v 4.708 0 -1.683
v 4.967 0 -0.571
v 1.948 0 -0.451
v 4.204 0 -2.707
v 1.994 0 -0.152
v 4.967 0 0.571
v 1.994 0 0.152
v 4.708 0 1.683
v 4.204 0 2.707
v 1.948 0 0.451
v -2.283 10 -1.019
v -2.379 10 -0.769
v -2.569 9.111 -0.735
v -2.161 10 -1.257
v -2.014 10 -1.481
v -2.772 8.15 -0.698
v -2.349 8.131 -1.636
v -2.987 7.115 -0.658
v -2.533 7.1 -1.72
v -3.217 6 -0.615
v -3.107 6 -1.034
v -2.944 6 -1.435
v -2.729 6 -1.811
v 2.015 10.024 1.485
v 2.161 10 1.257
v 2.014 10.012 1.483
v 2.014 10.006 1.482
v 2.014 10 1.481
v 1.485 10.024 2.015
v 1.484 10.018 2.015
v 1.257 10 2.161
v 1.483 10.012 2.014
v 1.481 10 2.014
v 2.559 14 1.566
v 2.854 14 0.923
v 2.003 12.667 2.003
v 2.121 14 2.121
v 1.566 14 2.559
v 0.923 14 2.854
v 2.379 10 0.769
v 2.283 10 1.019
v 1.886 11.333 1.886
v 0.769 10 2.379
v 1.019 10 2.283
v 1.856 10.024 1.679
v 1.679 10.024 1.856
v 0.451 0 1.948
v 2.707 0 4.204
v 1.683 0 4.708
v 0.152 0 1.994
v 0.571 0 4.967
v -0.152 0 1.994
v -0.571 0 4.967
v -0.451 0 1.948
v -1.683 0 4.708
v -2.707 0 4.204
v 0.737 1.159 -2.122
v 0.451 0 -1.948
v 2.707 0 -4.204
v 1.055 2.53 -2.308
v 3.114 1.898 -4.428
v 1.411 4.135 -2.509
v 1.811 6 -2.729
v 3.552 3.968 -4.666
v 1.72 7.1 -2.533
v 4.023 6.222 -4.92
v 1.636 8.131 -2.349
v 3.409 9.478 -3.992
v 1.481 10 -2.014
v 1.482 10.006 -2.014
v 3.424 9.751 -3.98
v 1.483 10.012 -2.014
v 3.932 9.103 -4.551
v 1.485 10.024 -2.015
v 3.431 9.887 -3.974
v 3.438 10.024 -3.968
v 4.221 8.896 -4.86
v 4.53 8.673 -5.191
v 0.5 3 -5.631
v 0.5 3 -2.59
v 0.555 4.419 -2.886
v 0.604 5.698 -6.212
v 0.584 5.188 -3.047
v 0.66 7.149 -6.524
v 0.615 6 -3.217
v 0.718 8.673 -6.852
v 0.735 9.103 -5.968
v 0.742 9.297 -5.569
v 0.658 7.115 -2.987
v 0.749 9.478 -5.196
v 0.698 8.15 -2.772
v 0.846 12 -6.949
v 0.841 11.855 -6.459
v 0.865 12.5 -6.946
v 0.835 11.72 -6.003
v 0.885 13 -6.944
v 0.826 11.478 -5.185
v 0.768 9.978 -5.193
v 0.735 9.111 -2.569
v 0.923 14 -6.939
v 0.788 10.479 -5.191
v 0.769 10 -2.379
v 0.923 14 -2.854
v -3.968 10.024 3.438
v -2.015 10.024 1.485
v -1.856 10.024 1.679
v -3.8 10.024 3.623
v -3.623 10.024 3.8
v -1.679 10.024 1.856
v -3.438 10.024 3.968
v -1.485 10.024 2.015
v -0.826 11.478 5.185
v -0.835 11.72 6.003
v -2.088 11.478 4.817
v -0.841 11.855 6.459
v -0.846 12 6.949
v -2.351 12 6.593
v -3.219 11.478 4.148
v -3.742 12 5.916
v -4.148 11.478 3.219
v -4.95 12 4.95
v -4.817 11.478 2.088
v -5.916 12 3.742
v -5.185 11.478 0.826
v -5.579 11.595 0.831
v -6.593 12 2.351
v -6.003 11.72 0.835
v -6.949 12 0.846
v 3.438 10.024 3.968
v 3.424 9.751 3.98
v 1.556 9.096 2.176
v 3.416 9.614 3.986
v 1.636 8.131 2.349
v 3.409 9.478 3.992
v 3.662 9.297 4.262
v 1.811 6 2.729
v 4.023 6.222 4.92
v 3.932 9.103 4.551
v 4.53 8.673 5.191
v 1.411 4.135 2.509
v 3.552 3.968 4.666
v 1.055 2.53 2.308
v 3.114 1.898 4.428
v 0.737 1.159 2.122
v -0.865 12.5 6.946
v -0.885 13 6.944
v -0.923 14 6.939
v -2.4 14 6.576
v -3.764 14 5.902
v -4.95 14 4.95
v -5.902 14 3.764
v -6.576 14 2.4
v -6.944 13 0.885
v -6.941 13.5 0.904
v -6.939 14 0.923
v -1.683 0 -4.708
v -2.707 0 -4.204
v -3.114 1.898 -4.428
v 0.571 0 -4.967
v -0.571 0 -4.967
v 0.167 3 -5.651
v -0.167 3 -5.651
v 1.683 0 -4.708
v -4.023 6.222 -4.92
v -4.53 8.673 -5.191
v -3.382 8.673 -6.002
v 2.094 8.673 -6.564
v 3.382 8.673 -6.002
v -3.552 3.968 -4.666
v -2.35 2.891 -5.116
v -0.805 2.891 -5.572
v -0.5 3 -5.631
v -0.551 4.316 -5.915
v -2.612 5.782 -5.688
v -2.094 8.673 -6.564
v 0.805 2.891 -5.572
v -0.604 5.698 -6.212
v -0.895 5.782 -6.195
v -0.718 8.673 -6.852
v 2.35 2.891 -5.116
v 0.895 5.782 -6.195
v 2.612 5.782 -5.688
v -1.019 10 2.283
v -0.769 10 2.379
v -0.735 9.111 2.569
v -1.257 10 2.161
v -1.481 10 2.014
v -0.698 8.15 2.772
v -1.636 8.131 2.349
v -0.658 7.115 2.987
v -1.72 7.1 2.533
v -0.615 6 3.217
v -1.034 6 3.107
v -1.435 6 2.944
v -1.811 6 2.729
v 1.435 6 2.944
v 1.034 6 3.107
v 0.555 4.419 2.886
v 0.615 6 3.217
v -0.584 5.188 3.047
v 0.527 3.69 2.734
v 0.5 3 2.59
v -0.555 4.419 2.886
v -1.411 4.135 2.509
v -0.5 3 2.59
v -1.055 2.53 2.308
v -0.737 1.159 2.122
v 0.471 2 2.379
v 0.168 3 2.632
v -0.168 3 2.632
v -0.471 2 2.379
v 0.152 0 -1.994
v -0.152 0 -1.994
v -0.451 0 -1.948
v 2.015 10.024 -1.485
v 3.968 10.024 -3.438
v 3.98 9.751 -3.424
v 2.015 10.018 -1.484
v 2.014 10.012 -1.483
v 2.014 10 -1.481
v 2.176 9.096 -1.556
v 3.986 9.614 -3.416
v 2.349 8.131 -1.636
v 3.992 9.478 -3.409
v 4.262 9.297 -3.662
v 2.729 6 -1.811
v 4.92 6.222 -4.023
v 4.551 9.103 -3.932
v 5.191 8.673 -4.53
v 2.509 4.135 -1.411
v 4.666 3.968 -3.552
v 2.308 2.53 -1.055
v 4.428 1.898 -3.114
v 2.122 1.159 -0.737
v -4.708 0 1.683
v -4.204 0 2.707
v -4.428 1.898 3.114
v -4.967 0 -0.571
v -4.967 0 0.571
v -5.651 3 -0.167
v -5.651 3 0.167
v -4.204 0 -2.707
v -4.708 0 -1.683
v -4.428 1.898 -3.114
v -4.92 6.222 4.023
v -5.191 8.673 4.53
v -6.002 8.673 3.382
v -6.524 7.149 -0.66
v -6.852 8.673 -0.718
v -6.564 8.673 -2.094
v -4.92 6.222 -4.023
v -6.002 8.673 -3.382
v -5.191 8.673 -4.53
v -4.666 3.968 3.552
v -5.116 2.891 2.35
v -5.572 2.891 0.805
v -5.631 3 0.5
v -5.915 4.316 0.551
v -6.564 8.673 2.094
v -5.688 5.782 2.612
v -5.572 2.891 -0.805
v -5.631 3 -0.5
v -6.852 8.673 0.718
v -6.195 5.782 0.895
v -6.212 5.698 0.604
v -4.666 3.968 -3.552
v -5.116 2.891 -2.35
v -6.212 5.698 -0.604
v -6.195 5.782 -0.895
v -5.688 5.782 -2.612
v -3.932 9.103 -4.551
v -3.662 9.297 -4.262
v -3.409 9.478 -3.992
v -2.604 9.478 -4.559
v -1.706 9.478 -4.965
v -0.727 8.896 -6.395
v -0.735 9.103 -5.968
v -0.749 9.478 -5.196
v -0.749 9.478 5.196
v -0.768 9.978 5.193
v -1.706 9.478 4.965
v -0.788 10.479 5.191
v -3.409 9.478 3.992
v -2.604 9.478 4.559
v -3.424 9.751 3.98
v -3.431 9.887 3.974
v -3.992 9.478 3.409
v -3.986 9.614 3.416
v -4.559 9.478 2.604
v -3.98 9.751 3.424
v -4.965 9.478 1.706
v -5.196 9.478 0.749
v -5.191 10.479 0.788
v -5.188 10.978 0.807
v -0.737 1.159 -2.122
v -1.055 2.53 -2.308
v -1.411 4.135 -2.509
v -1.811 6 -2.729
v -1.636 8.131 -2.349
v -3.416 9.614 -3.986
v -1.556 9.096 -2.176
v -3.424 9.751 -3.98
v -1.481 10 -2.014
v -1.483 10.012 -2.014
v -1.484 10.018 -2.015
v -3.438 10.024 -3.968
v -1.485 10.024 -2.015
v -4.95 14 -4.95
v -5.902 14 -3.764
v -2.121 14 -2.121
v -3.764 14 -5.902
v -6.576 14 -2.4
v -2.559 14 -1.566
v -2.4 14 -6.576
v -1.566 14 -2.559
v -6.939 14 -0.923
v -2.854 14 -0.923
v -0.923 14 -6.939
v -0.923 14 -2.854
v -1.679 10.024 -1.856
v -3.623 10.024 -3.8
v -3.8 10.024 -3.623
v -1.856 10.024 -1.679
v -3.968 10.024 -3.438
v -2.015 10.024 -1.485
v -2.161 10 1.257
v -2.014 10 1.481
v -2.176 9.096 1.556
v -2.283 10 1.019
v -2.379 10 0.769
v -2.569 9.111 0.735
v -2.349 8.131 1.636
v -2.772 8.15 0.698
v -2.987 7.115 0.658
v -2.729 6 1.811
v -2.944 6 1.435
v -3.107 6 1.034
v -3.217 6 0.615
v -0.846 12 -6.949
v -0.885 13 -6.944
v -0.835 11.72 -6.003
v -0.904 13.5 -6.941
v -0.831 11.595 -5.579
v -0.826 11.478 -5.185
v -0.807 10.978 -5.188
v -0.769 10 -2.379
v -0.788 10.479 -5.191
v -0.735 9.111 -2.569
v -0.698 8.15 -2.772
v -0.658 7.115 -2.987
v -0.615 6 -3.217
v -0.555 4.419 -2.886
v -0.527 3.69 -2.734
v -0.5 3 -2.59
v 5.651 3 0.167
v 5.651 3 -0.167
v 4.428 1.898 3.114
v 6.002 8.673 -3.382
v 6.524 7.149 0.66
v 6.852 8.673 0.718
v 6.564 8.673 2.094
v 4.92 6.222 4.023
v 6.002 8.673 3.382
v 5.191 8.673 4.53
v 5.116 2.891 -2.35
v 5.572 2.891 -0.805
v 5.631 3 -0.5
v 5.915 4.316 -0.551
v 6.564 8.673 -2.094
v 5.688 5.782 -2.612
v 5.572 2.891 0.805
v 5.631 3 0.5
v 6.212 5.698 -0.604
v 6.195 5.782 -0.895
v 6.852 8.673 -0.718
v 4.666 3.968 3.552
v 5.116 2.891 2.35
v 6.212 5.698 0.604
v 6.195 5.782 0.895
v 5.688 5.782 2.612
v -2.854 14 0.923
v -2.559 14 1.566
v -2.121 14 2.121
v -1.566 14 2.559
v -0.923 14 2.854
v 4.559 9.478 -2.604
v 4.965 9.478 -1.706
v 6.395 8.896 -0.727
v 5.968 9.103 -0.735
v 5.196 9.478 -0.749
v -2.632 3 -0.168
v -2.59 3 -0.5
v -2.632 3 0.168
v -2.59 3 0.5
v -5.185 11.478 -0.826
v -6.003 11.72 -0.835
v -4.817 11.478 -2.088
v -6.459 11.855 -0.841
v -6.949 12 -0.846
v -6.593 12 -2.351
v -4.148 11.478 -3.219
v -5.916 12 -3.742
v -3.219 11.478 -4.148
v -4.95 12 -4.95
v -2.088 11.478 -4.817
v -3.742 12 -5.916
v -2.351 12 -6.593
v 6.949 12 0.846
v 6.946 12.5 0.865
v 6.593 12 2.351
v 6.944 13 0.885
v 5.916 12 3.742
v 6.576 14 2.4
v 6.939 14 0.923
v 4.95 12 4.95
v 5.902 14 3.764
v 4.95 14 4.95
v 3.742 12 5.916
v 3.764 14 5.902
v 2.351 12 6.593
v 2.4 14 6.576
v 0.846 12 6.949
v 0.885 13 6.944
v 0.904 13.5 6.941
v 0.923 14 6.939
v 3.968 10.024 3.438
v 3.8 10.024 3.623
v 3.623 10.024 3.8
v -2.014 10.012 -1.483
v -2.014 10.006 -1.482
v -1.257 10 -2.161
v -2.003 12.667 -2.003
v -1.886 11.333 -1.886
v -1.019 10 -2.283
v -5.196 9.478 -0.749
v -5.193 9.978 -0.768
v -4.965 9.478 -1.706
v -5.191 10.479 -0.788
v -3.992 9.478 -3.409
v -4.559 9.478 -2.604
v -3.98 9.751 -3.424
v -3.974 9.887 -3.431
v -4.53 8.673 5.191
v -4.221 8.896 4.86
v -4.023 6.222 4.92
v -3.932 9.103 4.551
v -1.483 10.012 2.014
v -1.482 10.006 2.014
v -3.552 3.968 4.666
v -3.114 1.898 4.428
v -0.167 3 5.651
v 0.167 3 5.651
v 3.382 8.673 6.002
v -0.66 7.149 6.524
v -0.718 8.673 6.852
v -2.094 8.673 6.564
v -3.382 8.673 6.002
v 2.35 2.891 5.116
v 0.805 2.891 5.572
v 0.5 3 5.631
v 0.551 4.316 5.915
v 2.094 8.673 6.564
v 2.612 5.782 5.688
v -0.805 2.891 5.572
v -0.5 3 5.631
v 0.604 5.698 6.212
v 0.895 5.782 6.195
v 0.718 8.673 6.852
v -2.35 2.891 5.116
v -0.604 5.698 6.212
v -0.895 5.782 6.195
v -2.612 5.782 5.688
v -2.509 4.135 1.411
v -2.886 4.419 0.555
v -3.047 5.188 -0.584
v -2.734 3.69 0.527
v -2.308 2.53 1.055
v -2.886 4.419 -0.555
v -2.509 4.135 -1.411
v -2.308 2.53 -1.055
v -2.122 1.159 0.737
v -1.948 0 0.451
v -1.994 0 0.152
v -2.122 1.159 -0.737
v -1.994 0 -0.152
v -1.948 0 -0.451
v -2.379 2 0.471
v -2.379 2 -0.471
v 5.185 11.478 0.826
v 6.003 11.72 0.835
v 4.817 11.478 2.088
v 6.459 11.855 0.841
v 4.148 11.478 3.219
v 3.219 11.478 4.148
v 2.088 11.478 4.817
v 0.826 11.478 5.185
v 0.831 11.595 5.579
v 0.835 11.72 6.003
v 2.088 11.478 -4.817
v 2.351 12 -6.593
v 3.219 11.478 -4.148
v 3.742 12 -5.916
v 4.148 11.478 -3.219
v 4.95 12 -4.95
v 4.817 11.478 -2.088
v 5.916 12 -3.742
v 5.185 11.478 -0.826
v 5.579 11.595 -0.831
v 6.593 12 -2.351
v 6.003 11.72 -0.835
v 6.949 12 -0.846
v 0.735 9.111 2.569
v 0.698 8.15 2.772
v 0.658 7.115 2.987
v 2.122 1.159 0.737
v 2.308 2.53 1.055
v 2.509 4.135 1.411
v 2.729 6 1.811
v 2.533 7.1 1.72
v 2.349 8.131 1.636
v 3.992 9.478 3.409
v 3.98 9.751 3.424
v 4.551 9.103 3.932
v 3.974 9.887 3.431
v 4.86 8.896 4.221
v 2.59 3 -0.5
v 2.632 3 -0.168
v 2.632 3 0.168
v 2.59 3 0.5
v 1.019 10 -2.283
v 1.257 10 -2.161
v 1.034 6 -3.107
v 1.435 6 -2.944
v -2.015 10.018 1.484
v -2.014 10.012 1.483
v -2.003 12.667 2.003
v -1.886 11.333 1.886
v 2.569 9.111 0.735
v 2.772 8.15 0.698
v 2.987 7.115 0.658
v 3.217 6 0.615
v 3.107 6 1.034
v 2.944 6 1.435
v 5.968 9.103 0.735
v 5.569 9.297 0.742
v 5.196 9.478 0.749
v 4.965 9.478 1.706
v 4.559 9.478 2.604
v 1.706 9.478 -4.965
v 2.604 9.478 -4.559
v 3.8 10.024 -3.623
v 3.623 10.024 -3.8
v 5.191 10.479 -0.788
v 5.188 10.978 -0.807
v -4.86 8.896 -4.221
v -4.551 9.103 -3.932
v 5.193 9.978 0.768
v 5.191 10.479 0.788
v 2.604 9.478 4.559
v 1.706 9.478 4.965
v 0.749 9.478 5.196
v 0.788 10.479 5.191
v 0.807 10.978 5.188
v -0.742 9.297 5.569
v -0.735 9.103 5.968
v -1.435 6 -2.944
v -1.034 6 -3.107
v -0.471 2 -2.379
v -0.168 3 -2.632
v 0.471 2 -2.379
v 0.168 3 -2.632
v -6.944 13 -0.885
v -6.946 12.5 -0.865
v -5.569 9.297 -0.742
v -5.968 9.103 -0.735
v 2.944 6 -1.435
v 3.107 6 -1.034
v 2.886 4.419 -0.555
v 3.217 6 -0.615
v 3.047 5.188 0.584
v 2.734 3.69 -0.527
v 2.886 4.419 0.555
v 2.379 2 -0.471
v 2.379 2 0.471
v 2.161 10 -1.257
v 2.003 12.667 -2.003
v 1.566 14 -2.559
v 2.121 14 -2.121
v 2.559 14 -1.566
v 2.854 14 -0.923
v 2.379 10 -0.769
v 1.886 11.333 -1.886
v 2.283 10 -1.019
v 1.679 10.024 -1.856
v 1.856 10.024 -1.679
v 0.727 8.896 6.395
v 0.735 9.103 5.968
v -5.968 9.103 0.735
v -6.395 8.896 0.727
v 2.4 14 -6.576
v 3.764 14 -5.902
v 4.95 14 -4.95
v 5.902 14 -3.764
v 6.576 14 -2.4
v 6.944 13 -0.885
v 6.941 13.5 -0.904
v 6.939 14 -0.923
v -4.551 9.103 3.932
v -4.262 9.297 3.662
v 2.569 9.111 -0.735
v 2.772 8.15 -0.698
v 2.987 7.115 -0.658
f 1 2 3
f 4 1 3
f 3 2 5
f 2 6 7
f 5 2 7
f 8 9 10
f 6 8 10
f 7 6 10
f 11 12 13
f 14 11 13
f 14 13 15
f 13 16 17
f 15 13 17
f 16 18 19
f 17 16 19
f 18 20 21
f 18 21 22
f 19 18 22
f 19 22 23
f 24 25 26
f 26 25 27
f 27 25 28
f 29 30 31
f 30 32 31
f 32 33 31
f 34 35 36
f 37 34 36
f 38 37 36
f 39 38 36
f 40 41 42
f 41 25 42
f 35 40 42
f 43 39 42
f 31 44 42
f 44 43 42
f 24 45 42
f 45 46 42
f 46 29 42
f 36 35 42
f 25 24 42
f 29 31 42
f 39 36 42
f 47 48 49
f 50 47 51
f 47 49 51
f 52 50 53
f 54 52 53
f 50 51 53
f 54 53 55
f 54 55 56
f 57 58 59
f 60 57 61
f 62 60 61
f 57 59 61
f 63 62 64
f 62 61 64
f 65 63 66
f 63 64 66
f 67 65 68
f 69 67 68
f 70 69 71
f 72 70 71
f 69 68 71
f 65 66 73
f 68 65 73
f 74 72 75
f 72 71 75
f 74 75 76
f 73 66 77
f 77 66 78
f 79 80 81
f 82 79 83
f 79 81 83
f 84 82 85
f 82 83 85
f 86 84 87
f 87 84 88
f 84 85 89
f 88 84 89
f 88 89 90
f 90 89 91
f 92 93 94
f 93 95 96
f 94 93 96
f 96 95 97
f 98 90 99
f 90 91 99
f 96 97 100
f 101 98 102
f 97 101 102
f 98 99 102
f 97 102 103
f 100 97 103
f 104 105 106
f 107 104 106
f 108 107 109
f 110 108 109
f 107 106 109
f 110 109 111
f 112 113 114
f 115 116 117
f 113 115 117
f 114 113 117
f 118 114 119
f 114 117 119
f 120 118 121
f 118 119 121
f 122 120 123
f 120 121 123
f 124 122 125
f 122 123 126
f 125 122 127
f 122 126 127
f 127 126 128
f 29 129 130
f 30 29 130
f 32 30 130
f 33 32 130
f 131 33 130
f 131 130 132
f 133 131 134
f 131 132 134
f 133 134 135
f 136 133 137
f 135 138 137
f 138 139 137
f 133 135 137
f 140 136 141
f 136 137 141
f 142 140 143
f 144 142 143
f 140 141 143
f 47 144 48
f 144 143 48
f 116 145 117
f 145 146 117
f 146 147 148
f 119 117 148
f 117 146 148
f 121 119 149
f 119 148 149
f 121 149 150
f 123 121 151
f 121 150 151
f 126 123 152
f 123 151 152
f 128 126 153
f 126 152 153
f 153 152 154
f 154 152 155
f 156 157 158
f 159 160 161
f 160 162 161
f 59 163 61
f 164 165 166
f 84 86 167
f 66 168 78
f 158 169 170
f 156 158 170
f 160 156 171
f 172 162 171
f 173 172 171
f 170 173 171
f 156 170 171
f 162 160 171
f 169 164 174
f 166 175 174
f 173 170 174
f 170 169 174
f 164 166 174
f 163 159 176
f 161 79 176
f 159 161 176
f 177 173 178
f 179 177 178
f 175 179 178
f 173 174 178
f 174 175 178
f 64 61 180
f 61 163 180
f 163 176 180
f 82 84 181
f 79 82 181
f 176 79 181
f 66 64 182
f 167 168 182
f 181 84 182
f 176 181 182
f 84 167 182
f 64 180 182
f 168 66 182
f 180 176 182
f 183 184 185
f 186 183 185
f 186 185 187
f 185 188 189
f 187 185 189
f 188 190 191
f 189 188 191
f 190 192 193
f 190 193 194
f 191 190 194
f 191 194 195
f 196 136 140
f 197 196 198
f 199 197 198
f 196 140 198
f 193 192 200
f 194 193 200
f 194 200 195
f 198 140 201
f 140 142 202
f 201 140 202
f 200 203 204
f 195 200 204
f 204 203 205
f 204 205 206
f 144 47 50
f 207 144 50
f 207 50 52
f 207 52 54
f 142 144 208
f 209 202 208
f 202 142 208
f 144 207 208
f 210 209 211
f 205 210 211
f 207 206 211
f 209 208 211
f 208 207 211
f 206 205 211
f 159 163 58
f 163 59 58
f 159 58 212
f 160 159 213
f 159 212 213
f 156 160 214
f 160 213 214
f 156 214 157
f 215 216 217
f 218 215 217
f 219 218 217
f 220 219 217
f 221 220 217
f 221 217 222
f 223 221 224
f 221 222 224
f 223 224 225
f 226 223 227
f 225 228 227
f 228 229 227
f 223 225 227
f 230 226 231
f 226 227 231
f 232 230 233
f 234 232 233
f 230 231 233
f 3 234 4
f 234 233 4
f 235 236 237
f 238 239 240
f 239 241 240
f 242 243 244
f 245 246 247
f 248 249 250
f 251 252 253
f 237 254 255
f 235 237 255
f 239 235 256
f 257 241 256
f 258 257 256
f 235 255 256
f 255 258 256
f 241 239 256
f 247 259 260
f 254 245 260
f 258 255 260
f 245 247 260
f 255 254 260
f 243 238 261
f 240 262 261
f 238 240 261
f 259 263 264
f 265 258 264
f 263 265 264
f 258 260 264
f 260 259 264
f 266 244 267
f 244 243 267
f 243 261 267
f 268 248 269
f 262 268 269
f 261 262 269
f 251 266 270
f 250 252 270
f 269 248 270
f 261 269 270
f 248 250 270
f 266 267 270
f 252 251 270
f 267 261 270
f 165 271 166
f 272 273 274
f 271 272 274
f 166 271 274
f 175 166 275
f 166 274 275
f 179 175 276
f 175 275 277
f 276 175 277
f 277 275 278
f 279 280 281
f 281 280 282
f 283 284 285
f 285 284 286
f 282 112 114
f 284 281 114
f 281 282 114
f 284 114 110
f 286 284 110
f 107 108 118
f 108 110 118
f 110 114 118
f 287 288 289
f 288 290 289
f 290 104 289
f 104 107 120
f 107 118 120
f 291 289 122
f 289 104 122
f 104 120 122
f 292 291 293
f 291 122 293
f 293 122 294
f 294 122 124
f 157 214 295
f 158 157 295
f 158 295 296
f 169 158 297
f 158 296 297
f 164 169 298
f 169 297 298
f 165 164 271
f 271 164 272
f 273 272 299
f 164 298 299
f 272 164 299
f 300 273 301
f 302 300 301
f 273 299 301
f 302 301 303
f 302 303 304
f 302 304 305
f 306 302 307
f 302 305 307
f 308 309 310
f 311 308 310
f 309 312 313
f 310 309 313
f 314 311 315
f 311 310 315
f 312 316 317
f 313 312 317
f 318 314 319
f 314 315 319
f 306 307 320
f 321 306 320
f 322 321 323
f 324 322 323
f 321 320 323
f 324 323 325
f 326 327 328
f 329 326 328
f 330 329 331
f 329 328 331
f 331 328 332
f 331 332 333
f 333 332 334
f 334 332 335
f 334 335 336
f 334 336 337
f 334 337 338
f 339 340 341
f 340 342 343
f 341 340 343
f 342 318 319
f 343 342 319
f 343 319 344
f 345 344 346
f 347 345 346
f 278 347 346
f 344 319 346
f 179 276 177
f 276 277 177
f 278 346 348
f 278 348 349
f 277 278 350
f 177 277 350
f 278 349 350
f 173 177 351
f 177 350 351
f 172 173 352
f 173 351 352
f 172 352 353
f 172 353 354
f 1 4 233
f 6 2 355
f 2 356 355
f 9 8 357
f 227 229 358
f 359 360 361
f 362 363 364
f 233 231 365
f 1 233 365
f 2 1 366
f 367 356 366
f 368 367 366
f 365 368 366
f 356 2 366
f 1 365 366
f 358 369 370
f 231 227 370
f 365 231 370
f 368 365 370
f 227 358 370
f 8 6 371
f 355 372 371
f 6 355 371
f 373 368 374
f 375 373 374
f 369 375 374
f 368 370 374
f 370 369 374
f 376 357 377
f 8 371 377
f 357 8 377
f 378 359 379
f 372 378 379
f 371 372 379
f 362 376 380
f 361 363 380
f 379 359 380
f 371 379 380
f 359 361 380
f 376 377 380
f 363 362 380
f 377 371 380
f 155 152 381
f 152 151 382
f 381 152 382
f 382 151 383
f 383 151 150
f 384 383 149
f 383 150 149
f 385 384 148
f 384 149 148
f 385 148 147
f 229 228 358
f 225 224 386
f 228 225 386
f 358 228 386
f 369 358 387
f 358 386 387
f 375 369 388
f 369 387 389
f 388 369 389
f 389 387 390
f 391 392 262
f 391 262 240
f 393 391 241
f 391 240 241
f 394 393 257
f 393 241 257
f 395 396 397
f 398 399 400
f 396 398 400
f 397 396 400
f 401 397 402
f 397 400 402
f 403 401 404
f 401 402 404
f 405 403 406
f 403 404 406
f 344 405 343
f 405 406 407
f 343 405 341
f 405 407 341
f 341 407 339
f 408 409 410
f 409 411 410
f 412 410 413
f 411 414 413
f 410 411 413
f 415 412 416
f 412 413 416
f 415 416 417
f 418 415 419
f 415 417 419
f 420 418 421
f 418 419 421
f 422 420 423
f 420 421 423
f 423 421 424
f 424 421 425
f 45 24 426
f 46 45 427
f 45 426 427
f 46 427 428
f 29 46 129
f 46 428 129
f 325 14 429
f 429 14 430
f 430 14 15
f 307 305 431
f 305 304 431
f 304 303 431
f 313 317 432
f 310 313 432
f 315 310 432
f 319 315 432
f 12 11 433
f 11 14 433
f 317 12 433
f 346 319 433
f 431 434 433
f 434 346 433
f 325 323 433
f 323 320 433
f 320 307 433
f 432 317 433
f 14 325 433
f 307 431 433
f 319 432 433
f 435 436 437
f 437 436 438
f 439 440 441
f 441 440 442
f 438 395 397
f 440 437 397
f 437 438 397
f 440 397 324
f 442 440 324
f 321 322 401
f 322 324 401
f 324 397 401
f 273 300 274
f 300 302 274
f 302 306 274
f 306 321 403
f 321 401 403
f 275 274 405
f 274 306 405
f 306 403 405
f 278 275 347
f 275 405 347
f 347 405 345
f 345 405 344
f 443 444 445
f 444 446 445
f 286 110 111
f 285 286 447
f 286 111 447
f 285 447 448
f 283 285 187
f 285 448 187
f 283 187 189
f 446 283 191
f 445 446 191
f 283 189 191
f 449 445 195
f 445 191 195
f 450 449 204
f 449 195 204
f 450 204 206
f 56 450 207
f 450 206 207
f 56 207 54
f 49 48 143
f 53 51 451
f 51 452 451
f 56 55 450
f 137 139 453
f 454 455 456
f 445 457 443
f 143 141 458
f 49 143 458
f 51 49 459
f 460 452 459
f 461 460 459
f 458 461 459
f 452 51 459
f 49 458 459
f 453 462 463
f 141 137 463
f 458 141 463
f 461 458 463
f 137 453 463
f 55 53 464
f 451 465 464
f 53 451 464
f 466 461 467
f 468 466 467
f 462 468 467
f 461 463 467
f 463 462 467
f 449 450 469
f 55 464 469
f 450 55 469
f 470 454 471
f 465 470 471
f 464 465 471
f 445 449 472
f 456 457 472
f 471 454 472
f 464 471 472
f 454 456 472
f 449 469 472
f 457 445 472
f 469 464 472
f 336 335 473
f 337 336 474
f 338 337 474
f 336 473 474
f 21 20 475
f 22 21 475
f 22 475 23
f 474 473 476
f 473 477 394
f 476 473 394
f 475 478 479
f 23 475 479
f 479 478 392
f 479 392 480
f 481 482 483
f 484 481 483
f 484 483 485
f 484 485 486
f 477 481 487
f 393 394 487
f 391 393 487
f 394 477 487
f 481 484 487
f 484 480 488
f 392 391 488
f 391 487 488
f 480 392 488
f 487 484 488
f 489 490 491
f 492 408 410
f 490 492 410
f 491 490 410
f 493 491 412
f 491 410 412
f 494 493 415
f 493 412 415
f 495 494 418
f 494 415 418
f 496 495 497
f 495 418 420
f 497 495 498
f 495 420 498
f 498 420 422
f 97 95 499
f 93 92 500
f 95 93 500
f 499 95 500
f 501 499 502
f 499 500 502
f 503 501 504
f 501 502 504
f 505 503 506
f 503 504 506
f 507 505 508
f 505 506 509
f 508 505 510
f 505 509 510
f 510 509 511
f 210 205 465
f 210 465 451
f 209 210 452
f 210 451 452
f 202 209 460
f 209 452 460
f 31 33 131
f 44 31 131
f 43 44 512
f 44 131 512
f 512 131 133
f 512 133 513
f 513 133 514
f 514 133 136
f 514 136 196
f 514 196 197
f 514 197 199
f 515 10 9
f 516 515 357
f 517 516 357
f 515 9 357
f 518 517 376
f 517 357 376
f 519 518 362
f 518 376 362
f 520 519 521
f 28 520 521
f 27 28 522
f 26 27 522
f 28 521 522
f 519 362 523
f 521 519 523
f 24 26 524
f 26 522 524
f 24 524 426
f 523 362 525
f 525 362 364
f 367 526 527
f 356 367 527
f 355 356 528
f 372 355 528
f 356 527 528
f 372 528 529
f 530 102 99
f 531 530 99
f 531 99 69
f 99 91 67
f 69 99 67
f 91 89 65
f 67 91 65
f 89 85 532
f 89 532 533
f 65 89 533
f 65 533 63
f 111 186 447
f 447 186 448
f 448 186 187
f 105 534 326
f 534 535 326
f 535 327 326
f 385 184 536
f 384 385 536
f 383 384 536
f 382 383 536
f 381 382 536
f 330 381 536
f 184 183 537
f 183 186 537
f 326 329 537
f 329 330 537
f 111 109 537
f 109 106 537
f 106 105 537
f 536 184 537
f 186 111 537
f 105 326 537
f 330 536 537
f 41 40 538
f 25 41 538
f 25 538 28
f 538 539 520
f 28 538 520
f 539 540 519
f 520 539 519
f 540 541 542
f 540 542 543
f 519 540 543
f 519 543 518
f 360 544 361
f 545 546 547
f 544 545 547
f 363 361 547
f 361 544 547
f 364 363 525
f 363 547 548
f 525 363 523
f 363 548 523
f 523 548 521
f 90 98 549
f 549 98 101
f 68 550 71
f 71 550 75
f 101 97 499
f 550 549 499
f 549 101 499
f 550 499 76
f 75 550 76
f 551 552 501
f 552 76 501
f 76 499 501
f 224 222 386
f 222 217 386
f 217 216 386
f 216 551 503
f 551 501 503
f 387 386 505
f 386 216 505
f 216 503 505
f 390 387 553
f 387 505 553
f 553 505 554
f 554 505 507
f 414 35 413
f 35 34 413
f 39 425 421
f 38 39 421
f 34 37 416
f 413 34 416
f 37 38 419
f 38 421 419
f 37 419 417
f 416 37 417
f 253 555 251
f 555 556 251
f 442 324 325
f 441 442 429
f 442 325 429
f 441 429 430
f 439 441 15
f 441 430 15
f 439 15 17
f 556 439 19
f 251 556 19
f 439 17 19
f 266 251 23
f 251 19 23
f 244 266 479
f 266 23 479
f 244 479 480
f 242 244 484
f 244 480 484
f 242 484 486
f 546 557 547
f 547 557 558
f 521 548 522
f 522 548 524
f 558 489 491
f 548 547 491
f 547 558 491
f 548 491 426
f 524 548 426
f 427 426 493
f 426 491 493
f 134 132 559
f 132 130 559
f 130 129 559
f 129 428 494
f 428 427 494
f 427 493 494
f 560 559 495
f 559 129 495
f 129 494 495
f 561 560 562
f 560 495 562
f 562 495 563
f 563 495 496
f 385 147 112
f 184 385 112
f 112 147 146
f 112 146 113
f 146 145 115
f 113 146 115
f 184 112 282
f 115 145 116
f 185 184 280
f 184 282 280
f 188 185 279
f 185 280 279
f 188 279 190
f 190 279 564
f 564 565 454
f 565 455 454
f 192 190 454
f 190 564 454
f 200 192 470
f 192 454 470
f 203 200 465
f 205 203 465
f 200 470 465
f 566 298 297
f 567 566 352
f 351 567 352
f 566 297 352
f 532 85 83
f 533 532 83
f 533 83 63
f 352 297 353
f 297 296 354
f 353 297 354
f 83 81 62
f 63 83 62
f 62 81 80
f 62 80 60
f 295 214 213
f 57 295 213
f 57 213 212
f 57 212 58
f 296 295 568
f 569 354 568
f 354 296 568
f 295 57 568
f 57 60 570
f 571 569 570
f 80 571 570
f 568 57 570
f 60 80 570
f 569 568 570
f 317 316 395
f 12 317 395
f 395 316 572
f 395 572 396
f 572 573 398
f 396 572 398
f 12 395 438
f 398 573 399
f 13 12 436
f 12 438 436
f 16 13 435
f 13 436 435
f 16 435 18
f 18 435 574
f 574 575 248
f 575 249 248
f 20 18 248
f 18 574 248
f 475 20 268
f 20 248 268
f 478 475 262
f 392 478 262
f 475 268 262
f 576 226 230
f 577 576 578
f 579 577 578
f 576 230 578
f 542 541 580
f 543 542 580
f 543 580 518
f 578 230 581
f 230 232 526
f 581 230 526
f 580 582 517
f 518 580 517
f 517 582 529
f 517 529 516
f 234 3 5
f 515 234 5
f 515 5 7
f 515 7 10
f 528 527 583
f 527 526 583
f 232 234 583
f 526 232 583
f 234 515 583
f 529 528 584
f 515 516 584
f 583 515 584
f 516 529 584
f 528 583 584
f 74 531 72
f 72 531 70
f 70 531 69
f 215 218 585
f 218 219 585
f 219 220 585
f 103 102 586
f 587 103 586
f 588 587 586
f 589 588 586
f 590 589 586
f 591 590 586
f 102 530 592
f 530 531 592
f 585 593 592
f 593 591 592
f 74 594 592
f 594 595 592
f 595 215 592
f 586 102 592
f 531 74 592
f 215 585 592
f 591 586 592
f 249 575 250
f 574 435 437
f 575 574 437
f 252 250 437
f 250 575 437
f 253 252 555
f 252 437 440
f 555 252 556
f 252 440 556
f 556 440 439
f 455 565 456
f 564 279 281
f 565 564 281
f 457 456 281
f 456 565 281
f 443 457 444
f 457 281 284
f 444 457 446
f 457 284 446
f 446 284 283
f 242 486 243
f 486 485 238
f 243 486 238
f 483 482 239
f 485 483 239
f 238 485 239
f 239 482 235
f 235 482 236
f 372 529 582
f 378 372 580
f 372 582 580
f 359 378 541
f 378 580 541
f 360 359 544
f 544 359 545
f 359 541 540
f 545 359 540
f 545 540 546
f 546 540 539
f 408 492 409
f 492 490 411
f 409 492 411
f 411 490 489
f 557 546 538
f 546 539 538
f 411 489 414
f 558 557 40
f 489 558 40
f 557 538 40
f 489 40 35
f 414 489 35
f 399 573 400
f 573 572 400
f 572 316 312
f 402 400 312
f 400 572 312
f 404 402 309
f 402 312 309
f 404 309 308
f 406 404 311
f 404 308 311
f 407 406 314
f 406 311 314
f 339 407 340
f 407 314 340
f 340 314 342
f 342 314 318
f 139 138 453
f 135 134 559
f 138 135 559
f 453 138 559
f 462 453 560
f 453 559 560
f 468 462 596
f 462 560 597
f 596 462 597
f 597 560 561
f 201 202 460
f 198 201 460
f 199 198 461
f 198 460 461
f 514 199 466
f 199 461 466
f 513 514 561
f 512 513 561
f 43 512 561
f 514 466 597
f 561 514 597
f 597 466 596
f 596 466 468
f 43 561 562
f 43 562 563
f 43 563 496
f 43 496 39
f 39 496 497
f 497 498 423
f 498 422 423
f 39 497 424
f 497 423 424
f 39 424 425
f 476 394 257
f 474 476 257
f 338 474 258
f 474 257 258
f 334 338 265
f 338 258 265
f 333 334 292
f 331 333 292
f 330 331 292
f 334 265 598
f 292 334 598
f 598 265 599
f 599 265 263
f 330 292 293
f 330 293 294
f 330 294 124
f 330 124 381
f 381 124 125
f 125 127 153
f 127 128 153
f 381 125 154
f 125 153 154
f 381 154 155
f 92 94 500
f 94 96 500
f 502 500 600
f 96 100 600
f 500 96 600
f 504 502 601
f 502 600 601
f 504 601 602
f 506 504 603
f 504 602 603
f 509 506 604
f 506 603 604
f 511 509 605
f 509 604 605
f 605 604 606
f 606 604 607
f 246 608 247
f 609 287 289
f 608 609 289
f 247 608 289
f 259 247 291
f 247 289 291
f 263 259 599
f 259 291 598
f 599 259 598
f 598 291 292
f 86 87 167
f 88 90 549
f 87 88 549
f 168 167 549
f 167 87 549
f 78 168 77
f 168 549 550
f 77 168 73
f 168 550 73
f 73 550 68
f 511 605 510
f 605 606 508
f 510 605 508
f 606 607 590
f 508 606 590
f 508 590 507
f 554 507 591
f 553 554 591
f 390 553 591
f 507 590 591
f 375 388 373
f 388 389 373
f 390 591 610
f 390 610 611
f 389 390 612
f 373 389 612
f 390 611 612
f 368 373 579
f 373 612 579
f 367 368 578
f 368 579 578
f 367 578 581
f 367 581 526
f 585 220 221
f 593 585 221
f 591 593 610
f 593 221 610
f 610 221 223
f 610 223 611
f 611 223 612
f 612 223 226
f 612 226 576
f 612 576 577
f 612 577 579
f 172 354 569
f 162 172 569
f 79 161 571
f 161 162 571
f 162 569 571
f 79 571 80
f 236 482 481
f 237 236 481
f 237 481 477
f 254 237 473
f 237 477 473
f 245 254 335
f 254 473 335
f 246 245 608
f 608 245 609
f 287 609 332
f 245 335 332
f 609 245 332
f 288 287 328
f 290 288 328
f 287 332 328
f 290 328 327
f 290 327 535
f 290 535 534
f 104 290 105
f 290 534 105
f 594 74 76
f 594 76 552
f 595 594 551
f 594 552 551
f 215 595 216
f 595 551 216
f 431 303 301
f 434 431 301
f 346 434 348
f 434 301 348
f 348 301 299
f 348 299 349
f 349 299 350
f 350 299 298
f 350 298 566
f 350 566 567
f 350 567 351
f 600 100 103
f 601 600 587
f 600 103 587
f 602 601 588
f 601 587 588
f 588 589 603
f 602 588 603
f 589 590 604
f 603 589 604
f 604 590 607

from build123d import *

# Parameters (mm, degrees)
F3_DEPTH = 12.7
F4_COUNT = 2
F4_ANGLE = 90
F8_DEPTH = 12.7
F9_COUNT = 2
F9_ANGLE = 90


with BuildPart() as f1:
    # F0 (on Top) → F1 (revolve)
    with BuildSketch(Plane.XY):
        Polygon((7, 14), (3, 14), (2.5, 10), (3.275, 6), (2, 0), (5, 0), (6.889415849, 8.6733910541), (5.25, 9.4779638621), (5.25, 11.4779638621), (7, 12), align=None)
    revolve(axis=Axis((0, 3.7037534639, 0), (0, -1, 0)))


with BuildPart() as f3:
    # F2 (on Top) → F3 (new body, symmetric)
    with BuildSketch(Plane.XY):
        Polygon((0, 3), (0.5, 3), (1, 16), (0, 16), (-1, 16), (-0.5, 3), align=None)
    extrude(amount=F3_DEPTH, both=True)


with BuildPart() as f4_1:
    # F4: instance of F3
    add(f3.part.rotate(Axis((0, 3.7037534639, 0), (0, -1, 0)), 1 * F4_ANGLE / (F4_COUNT - 1)))


with BuildPart() as f1_1:
    add(f1.part)

    # F5: cut F3, F4_1
    add(f3.part, mode=Mode.SUBTRACT)
    add(f4_1.part, mode=Mode.SUBTRACT)


with BuildPart() as f8:
    # F7 (on line) → F8 (new body, symmetric)
    with BuildSketch(Plane(origin=(0, 0, 0), x_dir=(0.7071067812, 0, 0.7071067812), z_dir=(0.7071067812, 0, -0.7071067812))):
        Polygon((0.375, -10.0240074396), (1.125, 0.9756837906), (-1.125, 0.9756837906), (-0.375, -10.0240074396), align=None)
    extrude(amount=F8_DEPTH, both=True)


with BuildPart() as f9_1:
    # F9: instance of F8
    add(f8.part.rotate(Axis((0, 3.7037534639, 0), (0, -1, 0)), 1 * F9_ANGLE / (F9_COUNT - 1)))


with BuildPart() as f1_2:
    add(f1_1.part)

    # F10: cut F8, F9_1
    add(f8.part, mode=Mode.SUBTRACT)
    add(f9_1.part, mode=Mode.SUBTRACT)


solid = f1_2.part
